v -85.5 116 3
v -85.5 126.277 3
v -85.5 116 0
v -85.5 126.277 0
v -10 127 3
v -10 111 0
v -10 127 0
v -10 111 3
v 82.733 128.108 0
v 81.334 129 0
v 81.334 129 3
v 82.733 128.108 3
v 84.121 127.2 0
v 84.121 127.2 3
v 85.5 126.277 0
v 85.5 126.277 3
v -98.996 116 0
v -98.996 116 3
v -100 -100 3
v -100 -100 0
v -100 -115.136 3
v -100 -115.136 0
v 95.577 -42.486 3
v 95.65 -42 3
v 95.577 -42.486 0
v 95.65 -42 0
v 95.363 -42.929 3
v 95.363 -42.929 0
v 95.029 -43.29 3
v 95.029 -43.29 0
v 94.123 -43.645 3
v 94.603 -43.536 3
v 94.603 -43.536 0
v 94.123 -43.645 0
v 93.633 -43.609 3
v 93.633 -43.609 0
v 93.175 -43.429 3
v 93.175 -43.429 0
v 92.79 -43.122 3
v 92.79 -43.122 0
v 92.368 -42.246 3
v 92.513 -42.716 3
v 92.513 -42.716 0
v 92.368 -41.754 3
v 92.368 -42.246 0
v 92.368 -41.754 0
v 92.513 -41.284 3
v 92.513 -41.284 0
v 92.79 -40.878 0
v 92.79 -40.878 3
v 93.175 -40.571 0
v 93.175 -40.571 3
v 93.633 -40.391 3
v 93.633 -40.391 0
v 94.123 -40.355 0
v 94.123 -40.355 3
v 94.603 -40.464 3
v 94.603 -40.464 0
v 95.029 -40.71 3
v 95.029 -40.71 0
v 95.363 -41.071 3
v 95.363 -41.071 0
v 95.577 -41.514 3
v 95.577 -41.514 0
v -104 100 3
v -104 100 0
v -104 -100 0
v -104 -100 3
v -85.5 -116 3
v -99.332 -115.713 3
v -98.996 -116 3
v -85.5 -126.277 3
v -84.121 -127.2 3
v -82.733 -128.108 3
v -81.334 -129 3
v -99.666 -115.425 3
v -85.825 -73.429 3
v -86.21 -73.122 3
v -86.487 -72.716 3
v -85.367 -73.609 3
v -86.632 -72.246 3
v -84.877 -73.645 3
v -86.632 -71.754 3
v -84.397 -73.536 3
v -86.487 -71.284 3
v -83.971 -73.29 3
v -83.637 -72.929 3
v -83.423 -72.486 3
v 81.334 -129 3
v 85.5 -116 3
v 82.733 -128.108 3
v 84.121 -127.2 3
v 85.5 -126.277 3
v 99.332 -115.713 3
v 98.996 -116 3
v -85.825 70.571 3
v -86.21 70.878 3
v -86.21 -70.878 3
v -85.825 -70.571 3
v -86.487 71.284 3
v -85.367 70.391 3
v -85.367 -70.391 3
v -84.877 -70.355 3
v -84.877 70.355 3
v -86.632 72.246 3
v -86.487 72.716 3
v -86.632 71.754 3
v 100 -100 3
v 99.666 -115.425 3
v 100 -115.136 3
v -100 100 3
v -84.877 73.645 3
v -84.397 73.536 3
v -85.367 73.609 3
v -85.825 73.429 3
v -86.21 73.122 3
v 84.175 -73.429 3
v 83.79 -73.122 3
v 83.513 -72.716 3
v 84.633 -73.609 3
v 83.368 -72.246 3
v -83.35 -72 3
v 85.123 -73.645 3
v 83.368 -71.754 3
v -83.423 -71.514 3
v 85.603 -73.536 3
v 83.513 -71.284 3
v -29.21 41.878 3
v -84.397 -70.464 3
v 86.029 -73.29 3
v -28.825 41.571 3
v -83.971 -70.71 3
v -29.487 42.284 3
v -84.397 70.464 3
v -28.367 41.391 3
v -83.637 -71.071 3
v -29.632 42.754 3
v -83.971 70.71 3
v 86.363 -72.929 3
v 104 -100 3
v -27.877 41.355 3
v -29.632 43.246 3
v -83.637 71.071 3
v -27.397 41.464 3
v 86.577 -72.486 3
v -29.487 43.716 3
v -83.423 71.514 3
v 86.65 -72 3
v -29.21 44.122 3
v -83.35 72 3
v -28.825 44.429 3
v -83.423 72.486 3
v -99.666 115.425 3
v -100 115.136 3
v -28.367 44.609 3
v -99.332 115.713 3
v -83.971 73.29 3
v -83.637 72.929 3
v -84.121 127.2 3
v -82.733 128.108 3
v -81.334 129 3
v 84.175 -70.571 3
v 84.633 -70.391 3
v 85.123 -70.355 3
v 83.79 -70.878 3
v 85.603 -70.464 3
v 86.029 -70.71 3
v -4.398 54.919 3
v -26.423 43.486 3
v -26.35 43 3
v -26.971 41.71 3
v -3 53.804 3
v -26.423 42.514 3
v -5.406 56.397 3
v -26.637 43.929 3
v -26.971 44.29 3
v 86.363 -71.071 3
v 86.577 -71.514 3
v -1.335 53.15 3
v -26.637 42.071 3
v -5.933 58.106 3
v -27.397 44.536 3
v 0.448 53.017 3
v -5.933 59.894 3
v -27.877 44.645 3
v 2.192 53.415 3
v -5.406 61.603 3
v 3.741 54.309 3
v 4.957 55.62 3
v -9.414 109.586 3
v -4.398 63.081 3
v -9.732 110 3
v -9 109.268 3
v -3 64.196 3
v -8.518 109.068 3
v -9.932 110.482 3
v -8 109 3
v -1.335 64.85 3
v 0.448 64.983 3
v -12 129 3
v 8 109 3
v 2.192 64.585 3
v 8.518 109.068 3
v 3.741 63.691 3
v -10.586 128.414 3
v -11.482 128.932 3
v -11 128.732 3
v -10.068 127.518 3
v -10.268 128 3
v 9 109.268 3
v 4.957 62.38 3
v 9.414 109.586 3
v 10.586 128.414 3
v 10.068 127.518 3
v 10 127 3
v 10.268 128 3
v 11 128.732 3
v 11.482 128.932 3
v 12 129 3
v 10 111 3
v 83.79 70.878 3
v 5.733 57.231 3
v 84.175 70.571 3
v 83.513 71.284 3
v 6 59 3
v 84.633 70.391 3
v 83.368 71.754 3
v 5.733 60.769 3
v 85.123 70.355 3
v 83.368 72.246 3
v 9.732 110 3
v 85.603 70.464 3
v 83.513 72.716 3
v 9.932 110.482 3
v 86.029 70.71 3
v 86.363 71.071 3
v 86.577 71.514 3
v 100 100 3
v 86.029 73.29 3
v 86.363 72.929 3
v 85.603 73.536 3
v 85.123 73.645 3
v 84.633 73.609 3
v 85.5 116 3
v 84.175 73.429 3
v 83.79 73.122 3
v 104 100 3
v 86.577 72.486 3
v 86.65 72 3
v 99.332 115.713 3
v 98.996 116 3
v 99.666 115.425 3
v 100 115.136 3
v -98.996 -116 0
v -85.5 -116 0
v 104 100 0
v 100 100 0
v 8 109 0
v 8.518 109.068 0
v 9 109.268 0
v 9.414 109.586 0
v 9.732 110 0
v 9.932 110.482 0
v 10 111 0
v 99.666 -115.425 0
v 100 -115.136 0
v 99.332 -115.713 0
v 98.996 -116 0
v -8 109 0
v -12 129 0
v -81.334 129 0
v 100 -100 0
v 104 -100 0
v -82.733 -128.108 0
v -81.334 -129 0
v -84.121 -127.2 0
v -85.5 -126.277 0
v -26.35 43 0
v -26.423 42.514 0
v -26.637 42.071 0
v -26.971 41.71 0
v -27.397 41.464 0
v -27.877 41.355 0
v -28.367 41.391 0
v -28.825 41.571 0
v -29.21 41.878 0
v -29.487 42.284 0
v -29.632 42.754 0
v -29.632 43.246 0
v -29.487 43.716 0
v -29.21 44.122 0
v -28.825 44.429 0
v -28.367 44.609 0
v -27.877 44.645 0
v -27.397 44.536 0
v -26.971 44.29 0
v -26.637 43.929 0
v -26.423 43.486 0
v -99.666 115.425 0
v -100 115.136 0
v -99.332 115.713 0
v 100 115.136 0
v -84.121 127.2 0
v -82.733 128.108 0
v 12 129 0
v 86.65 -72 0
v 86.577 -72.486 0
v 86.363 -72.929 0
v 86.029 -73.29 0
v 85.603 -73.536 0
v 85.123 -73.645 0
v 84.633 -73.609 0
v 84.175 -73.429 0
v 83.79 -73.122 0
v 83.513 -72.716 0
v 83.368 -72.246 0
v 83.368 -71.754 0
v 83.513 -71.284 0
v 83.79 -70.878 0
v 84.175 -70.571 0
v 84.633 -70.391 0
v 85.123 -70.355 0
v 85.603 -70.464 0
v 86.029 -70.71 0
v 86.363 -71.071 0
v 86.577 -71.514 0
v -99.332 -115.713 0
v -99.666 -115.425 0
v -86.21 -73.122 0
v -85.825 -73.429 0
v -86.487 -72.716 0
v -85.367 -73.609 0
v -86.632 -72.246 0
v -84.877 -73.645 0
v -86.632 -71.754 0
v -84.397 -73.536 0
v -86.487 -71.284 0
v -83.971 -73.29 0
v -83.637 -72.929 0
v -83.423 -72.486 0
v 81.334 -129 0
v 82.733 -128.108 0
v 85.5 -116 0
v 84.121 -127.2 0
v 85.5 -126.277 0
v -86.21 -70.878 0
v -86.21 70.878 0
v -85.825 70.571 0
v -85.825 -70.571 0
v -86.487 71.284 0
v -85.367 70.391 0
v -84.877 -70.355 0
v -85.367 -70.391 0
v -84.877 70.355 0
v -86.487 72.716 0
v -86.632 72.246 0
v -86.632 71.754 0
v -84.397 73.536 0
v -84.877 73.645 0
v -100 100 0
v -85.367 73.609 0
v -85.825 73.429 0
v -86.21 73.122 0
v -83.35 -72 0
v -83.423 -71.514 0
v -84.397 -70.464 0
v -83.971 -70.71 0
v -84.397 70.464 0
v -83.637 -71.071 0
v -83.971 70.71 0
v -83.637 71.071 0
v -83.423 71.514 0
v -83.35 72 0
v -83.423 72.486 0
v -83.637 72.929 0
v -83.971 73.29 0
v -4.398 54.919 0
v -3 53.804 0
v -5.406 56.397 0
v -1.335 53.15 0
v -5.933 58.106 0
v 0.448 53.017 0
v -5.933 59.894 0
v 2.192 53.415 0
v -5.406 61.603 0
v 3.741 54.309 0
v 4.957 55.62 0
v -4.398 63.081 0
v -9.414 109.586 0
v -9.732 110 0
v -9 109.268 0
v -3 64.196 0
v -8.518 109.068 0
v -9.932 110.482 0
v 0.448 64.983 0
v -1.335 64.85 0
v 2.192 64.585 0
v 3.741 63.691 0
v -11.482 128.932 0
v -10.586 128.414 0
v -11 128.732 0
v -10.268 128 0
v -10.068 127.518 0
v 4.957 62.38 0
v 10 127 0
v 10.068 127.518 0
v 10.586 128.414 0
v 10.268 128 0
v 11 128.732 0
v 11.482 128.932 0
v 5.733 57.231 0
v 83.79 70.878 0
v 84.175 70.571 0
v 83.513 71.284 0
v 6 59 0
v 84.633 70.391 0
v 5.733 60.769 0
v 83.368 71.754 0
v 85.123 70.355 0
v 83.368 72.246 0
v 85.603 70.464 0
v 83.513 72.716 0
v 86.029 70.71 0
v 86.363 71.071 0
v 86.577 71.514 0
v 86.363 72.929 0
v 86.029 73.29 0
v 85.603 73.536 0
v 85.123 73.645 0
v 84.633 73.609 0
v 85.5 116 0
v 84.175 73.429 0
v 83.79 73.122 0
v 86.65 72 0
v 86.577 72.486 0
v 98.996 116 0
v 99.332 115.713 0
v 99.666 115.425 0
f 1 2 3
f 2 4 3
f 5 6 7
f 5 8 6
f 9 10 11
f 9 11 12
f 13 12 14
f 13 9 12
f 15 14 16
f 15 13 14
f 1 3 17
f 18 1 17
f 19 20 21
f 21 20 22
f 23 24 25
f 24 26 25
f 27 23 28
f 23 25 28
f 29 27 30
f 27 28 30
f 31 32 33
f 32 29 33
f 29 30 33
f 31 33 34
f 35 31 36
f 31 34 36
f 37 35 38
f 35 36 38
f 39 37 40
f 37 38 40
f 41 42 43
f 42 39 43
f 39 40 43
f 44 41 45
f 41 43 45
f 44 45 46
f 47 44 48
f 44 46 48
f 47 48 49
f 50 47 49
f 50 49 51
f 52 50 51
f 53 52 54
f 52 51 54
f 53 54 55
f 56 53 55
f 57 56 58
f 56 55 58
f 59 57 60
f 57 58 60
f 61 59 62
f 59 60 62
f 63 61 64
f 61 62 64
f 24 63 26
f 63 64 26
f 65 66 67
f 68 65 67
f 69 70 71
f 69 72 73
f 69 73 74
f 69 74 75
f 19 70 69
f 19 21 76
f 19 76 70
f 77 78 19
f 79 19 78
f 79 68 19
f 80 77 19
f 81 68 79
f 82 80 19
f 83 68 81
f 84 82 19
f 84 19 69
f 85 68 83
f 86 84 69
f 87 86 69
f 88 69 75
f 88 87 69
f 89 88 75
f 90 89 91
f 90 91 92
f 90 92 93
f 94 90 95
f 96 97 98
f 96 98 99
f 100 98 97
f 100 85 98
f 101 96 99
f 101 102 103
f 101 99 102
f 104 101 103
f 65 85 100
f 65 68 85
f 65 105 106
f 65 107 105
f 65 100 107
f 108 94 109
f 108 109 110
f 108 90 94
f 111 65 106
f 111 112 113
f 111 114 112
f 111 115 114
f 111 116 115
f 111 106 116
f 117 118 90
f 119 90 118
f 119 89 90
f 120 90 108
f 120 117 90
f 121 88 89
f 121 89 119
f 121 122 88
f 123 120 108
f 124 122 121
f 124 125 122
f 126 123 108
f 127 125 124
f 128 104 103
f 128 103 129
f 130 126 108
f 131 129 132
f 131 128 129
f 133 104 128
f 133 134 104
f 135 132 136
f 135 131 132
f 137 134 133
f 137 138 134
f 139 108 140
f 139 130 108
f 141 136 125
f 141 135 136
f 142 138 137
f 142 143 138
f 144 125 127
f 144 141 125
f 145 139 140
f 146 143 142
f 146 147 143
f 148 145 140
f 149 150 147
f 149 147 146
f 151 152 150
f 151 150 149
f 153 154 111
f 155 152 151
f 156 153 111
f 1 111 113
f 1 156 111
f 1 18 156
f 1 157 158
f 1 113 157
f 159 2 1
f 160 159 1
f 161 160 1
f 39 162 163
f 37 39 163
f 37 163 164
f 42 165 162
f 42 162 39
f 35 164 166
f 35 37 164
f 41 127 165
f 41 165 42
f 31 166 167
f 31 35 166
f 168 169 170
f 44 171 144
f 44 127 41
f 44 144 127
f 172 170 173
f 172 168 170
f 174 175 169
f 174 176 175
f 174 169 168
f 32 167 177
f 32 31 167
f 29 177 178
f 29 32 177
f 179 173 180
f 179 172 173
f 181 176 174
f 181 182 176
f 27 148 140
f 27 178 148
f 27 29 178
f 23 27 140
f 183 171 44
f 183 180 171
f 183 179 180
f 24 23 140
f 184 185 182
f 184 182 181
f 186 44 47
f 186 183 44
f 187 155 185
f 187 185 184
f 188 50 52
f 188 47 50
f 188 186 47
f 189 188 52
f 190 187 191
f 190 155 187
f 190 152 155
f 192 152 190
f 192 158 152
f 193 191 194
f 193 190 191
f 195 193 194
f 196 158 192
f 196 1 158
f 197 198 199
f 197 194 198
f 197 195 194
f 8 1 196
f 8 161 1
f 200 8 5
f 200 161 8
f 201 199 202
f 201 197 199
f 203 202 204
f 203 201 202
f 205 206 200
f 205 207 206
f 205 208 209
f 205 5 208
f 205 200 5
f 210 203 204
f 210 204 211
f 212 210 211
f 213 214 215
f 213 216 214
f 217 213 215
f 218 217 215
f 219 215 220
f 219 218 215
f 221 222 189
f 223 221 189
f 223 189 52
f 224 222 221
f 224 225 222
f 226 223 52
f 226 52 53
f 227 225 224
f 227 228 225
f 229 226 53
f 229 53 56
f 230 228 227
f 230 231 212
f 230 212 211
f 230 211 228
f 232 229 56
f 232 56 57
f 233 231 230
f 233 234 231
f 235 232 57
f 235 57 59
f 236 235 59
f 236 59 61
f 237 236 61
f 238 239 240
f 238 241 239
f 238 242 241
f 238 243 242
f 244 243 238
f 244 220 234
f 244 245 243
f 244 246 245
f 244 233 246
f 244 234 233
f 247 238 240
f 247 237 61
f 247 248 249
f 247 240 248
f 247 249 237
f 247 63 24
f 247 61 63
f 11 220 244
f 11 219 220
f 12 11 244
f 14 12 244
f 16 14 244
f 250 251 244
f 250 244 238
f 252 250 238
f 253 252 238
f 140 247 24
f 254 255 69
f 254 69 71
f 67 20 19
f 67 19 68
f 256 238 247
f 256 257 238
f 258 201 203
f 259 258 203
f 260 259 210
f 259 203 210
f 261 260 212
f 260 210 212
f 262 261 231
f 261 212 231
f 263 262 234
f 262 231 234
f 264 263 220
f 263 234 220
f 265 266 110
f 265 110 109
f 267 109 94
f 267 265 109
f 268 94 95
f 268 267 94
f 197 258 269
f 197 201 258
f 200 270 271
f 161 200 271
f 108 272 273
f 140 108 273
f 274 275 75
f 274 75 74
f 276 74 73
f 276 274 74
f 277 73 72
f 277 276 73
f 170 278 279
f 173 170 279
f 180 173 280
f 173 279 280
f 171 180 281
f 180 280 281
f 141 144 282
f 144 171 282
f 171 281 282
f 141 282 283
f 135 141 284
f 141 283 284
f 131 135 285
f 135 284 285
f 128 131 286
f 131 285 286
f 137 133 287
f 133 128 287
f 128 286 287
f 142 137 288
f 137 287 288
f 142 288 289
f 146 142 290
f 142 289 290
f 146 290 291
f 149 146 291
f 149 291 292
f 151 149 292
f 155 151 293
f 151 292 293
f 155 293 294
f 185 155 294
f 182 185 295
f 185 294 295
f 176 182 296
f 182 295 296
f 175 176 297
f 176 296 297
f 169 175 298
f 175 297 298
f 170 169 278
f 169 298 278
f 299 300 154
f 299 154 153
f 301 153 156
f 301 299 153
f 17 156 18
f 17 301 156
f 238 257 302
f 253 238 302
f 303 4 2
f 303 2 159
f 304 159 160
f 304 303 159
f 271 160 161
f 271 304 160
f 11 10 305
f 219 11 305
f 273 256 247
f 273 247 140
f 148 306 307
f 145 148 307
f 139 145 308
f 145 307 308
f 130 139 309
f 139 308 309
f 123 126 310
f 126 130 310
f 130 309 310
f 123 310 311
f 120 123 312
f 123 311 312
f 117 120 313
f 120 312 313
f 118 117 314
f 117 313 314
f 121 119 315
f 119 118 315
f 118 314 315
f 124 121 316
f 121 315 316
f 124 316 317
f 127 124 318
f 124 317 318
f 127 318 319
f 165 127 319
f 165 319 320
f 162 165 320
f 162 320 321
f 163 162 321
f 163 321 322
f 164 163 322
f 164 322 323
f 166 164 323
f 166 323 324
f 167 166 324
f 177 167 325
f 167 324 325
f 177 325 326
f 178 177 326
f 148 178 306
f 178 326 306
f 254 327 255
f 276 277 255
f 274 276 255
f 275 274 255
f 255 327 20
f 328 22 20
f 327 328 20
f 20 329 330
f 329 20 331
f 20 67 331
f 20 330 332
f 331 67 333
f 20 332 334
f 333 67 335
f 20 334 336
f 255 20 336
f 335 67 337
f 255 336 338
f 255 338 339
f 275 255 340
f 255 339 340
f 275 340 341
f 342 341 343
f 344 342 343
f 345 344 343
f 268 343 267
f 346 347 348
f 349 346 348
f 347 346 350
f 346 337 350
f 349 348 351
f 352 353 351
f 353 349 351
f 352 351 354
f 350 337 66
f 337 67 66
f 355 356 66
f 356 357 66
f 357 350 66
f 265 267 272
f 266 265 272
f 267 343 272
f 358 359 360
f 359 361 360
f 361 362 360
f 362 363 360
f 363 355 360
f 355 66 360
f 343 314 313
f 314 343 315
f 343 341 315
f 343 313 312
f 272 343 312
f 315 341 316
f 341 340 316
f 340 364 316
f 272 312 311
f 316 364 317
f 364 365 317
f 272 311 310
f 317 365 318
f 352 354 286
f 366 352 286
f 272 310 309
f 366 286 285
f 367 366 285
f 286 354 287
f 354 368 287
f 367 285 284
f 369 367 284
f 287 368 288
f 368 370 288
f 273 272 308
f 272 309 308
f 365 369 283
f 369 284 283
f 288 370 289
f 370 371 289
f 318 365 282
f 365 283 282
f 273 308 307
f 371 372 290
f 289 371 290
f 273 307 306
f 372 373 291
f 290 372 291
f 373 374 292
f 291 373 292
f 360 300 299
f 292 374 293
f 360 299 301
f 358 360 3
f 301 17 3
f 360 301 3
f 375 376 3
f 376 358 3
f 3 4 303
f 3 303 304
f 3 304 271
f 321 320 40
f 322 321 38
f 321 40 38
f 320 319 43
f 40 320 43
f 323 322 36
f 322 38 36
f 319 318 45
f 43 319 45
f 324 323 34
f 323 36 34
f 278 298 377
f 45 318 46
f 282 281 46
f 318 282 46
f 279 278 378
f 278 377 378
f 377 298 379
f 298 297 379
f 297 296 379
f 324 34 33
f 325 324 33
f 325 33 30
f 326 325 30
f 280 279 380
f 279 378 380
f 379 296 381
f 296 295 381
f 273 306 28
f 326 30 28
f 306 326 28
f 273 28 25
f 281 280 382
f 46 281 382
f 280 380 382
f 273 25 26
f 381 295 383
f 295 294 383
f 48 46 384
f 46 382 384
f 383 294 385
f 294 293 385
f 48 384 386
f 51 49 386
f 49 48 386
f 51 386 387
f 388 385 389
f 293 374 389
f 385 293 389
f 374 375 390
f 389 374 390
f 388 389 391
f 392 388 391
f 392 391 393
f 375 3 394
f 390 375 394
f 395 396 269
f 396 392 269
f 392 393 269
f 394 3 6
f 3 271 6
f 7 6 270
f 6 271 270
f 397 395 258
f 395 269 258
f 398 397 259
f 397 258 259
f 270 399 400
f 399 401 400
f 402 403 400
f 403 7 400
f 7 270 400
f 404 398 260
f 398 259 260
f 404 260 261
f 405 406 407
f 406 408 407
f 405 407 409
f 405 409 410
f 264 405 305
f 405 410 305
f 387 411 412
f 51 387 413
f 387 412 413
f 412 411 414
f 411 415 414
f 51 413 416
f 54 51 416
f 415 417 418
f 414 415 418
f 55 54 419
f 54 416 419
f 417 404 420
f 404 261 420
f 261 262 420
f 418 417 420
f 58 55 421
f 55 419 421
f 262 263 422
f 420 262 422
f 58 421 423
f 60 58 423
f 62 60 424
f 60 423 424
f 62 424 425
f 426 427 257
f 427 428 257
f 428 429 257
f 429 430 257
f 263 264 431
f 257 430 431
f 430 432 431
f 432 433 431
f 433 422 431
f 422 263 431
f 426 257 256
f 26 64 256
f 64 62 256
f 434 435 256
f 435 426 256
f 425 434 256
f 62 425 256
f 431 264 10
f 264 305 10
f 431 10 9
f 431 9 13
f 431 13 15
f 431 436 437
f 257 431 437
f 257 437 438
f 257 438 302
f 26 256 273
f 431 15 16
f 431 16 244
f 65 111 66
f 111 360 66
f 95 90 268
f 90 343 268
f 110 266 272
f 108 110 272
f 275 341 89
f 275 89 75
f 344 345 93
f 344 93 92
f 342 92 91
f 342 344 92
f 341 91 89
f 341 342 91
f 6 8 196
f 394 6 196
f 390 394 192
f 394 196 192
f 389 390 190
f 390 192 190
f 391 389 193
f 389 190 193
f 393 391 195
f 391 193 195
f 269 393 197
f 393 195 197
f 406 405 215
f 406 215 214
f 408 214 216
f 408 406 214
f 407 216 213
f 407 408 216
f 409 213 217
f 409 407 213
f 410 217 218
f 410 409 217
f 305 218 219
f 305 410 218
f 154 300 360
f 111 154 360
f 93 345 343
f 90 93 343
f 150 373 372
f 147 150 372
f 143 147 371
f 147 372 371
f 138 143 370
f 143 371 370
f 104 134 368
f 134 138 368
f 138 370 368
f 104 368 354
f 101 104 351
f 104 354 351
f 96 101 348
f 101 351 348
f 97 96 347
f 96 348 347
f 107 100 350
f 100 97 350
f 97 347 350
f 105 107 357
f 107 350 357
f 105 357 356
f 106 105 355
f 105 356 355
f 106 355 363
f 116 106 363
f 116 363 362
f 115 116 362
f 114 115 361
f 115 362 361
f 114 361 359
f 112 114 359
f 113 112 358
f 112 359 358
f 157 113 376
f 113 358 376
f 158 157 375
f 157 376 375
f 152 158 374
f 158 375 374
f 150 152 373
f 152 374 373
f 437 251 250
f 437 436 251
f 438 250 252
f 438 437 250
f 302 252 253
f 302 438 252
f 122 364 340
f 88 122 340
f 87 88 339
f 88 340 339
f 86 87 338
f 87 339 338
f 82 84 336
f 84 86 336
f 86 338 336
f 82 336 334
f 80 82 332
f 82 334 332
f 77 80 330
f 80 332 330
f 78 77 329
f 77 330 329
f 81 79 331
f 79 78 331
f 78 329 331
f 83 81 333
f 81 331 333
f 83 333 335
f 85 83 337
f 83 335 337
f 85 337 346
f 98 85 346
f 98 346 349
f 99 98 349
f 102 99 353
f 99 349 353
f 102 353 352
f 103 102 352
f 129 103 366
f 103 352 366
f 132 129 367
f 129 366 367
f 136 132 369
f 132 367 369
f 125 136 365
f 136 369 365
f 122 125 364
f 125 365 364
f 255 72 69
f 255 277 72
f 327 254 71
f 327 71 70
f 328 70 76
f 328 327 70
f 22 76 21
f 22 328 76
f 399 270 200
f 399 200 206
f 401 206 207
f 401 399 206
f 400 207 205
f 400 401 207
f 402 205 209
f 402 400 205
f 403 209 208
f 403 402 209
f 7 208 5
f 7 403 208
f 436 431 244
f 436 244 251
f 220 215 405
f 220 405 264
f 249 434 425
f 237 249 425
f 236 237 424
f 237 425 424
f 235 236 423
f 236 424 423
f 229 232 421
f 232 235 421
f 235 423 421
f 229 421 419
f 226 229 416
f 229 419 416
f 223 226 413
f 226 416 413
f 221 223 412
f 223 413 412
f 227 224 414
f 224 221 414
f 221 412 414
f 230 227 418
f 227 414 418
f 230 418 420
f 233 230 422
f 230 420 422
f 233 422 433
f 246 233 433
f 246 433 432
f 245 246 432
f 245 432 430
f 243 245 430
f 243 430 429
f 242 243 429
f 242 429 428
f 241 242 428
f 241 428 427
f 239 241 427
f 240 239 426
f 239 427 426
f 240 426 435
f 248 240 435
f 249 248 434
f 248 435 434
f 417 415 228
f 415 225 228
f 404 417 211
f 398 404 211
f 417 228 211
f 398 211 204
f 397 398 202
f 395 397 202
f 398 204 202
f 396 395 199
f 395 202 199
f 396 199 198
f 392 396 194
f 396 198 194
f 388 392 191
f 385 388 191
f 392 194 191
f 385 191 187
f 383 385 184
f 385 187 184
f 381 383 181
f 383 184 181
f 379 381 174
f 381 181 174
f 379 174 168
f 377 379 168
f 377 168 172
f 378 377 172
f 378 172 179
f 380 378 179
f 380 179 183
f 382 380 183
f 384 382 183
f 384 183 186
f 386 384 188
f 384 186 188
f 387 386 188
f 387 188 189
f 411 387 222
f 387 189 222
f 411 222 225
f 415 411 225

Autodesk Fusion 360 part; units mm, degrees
sketch "Sketch1" plane through (0, 0, 0) normal (0, 0, 1) x (1, 0, 0)
  line L0 (100, 125) -> (-100, 125)
  line L1 (-100, 125) -> (-100, -125)
  line L2 (-100, -125) -> (100, -125)
  line L3 (100, -125) -> (100, 125)
  line L4 (100, 125) -> (-100, -125) construction
  line L5 (-100, 125) -> (100, -125) construction
  line L6 (-100, 125) -> (100, 125)
  line L7 (100, 125) -> (100, 129)
  line L8 (100, 129) -> (-100, 129)
  line L9 (-100, 129) -> (-100, 125)
  line L10 (-100, -125) -> (100, -125)
  line L11 (100, -125) -> (100, -129)
  line L12 (100, -129) -> (-100, -129)
  line L13 (-100, -129) -> (-100, -125)
  line L14 (100, 125) -> (104, 125)
  line L15 (104, 125) -> (104, -125)
  line L16 (104, -125) -> (100, -125)
  line L17 (100, -125) -> (100, 125)
  line L18 (-100, 125) -> (-104, 125)
  line L19 (-104, 125) -> (-104, -125)
  line L20 (-104, -125) -> (-100, -125)
  line L21 (-100, -125) -> (-100, 125)
  line L22 (-80, -53.8) -> (-80, 2.2) construction
  circle A0 centre (-80, -53.8) radius 1.65 construction
  circle A1 centre (-80, 2.2) radius 1.65 construction
  line L23 (-61.0622, -1) -> (-98.9378, -1) construction
  line L24 (-98.9378, -1) -> (-98.9378, -50.6) construction
  line L25 (-98.9378, -50.6) -> (-61.0622, -50.6) construction
  line L26 (-61.0622, -50.6) -> (-61.0622, -1) construction
  line L27 (-61.0622, -1) -> (-98.9378, -50.6) construction
  line L28 (-98.9378, -1) -> (-61.0622, -50.6) construction
  line L29 (-30.5, 49.5) -> (98.5, 49.5) construction
  line L30 (98.5, 49.5) -> (98.5, -47.5) construction
  line L31 (98.5, -47.5) -> (-30.5, -47.5) construction
  line L32 (-30.5, -47.5) -> (-30.5, 49.5) construction
  circle A2 centre (-28, 43) radius 1.65
  circle A3 centre (94, -42) radius 1.65
  line L33 (-100, 125) -> (-85.5, 125)
  line L34 (-85.5, 125) -> (-85.5, 116)
  line L35 (-85.5, 116) -> (-100, 116)
  line L36 (-100, 116) -> (-100, 125)
  line L37 (100, 125) -> (85.5, 125)
  line L38 (85.5, 125) -> (85.5, 116)
  line L39 (85.5, 116) -> (100, 116)
  line L40 (100, 116) -> (100, 125)
  line L41 (-100, -125) -> (-85.5, -125)
  line L42 (-85.5, -125) -> (-85.5, -116)
  line L43 (-85.5, -116) -> (-100, -116)
  line L44 (-100, -116) -> (-100, -125)
  line L45 (100, -125) -> (85.5, -125)
  line L46 (85.5, -125) -> (85.5, -116)
  line L47 (85.5, -116) -> (100, -116)
  line L48 (100, -116) -> (100, -125)
  line L49 (-100, 100) -> (-104, 100)
  line L50 (100, 100) -> (104, 100)
  line L51 (-100, -100) -> (-104, -100)
  line L52 (100, -100) -> (104, -100)
  line L53 (-85.5, 125) -> (-85.5, 129)
  line L54 (85.5, 125) -> (85.5, 129)
  line L55 (-85.5, -125) -> (-85.5, -129)
  line L56 (85.5, -125) -> (85.5, -129)
  line L57 (-115, -140) -> (-75, -140) construction
  line L58 (-75, -140) -> (-75, -87) construction
  line L59 (-75, -87) -> (-115, -87) construction
  line L60 (-115, -87) -> (-115, -140) construction
  line L61 (-63.3606, -140) -> (-21.3606, -140) construction
  line L62 (-21.3606, -140) -> (-21.3606, -53.8) construction
  line L63 (-21.3606, -53.8) -> (-63.3606, -53.8) construction
  line L64 (-63.3606, -53.8) -> (-63.3606, -140) construction
  line L65 (-100, 0) -> (-118.2487, 0) construction
  circle A4 centre (0, 0) radius 152.5
  circle A5 centre (-85, -72) radius 1.65
  line L66 (-85, -72) -> (85, -72) construction
  line L67 (85, -72) -> (85, 72) construction
  line L68 (85, 72) -> (-85, 72) construction
  line L69 (-85, 72) -> (-85, -72) construction
  circle A6 centre (85, 72) radius 1.65
  circle A7 centre (85, -72) radius 1.65
  circle A8 centre (-85, 72) radius 1.65
  point P0 (-80, -25.8)
  dimension "d1" = 200
  dimension "d2" = 250
  dimension "d3" = 4
  dimension "d4" = 4
  dimension "d5" = 4
  dimension "d6" = 4
  dimension "d7" = 20
  dimension "d8" = 56
  dimension "d10" = 3.3
  dimension "d11" = 37.8755
  dimension "d12" = 49.6
  dimension "d13" = 2.5
  dimension "d14" = 6.5
  dimension "d15" = 3.3
  dimension "d16" = 5.5
  dimension "d17" = 4.5
  dimension "d18" = 129
  dimension "d19" = 97
  dimension "d20" = 1.5
  dimension "d21" = 14.5
  dimension "d22" = 9
  dimension "d23" = 14.5
  dimension "d24" = 9
  dimension "d25" = 14.5
  dimension "d26" = 14.5
  dimension "d27" = 9
  dimension "d28" = 9
  dimension "d29" = 25
  dimension "d30" = 25
  dimension "d31" = 25
  dimension "d32" = 25
  dimension "d33" = 40
  dimension "d34" = 53
  dimension "d35" = 15
  dimension "d36" = 15
  dimension "d37" = 3.3
  dimension "d38" = 86.2
  dimension "d39" = 42
  dimension "d40" = 1
  dimension "d50" = 305
  dimension "d51" = 3.3
  dimension "d52" = 15
  dimension "d53" = 15
  dimension "d54" = 15
  dimension "d55" = 53
  dimension "d56" = 53
  dimension "d57" = 170
  dimension "d58" = 144
  dimension "d60" = 47.5
  dimension "d61" = 49.5
extrude "Extrude1" add sketch "Sketch1" along normal blind 3 contours L0 L1 L2 L3 L6 L10 L17 L21 L34 L35 L38 L39 L42 L43 L46 L47 A4 | L0 L6 L8 L53 L54 A4 | L3 L15 L17 L50 L52 | L1 L19 L21 L49 L51 | L2 L10 L12 L55 L56 A4
sketch "Sketch2" plane through (0, 0, 3) normal (0, 0, 1) x (1, 0, 0)
  circle A0 centre (85, -72) radius 1.65
  circle A1 centre (-85, -72) radius 1.65
  circle A2 centre (85, 72) radius 1.65
  circle A3 centre (94, -42) radius 1.65
  circle A4 centre (-85, 72) radius 1.65
  circle A5 centre (-28, 43) radius 1.65
  line L0 (100, 100) -> (100, 115.1358)
  arc A6 (100, 115.1358) -> (98.9962, 116) centre (0, 0) ccw
  line L1 (98.9962, 116) -> (85.5, 116)
  line L2 (85.5, 116) -> (85.5, 126.2775)
  arc A7 (85.5, 126.2775) -> (81.3342, 129) centre (0, 0) ccw
  line L3 (81.3342, 129) -> (-81.3342, 129)
  arc A8 (-81.3342, 129) -> (-85.5, 126.2775) centre (0, 0) ccw
  line L4 (-85.5, 126.2775) -> (-85.5, 116)
  line L5 (-85.5, 116) -> (-98.9962, 116)
  arc A9 (-98.9962, 116) -> (-100, 115.1358) centre (0, 0) ccw
  line L6 (-100, 115.1358) -> (-100, 100)
  line L7 (-100, 100) -> (-104, 100)
  line L8 (-104, 100) -> (-104, -100)
  line L9 (-104, -100) -> (-100, -100)
  line L10 (-100, -100) -> (-100, -115.1358)
  arc A10 (-100, -115.1358) -> (-98.9962, -116) centre (0, 0) ccw
  line L11 (-98.9962, -116) -> (-85.5, -116)
  line L12 (-85.5, -116) -> (-85.5, -126.2775)
  arc A11 (-85.5, -126.2775) -> (-81.3342, -129) centre (0, 0) ccw
  line L13 (-81.3342, -129) -> (81.3342, -129)
  arc A12 (81.3342, -129) -> (85.5, -126.2775) centre (0, 0) ccw
  line L14 (85.5, -126.2775) -> (85.5, -116)
  line L15 (85.5, -116) -> (98.9962, -116)
  arc A13 (98.9962, -116) -> (100, -115.1358) centre (0, 0) ccw
  line L16 (100, -115.1358) -> (100, -100)
  line L17 (100, -100) -> (104, -100)
  line L18 (104, -100) -> (104, 100)
  line L19 (104, 100) -> (100, 100)
  line L20 (-10, 129) -> (10, 129)
  line L21 (10, 129) -> (10, 111)
  line L22 (8, 109) -> (-8, 109)
  line L23 (-10, 111) -> (-10, 129)
  arc A14 (-10, 111) -> (-8, 109) centre (-8, 111) ccw
  arc A15 (8, 109) -> (10, 111) centre (8, 111) ccw
  point P0 (10, 109)
  point P1 (-10, 109)
  dimension "d62" = 20
  dimension "d63" = 20
  dimension "d64" = 2
extrude "Extrude2" cut sketch "Sketch2" against normal blind 3 contours L3 L20 L21 L22 L23 A14 A15
fillet "Fillet4" radius 2 2 edges at (-10, 129, 1.5) (10, 129, 1.5)
sketch "Sketch3" plane through (0, 0, 3) normal (0, 0, 1) x (1, 0, 0)
  arc A0 (12, 129) -> (10, 127) centre (12, 127) ccw
  line L0 (10, 127) -> (10, 111)
  arc A1 (8, 109) -> (10, 111) centre (8, 111) ccw
  line L1 (8, 109) -> (-8, 109)
  arc A2 (-10, 111) -> (-8, 109) centre (-8, 111) ccw
  line L2 (-10, 111) -> (-10, 127)
  arc A3 (-10, 127) -> (-12, 129) centre (-12, 127) ccw
  line L3 (-12, 129) -> (-81.3342, 129)
  arc A4 (-81.3342, 129) -> (-85.5, 126.2775) centre (0, 0) ccw
  line L4 (-85.5, 126.2775) -> (-85.5, 116)
  line L5 (-85.5, 116) -> (-98.9962, 116)
  arc A5 (-98.9962, 116) -> (-100, 115.1358) centre (0, 0) ccw
  line L6 (-100, 115.1358) -> (-100, 100)
  line L7 (-100, 100) -> (-104, 100)
  line L8 (-104, 100) -> (-104, -100)
  line L9 (-104, -100) -> (-100, -100)
  line L10 (-100, -100) -> (-100, -115.1358)
  arc A6 (-100, -115.1358) -> (-98.9962, -116) centre (0, 0) ccw
  line L11 (-98.9962, -116) -> (-85.5, -116)
  line L12 (-85.5, -116) -> (-85.5, -126.2775)
  arc A7 (-85.5, -126.2775) -> (-81.3342, -129) centre (0, 0) ccw
  line L13 (-81.3342, -129) -> (81.3342, -129)
  arc A8 (81.3342, -129) -> (85.5, -126.2775) centre (0, 0) ccw
  line L14 (85.5, -126.2775) -> (85.5, -116)
  line L15 (85.5, -116) -> (98.9962, -116)
  arc A9 (98.9962, -116) -> (100, -115.1358) centre (0, 0) ccw
  line L16 (100, -115.1358) -> (100, -100)
  line L17 (100, -100) -> (104, -100)
  line L18 (104, -100) -> (104, 100)
  line L19 (104, 100) -> (100, 100)
  line L20 (100, 100) -> (100, 115.1358)
  arc A10 (100, 115.1358) -> (98.9962, 116) centre (0, 0) ccw
  line L21 (98.9962, 116) -> (85.5, 116)
  line L22 (85.5, 116) -> (85.5, 126.2775)
  arc A11 (85.5, 126.2775) -> (81.3342, 129) centre (0, 0) ccw
  line L23 (81.3342, 129) -> (12, 129)
  circle A12 centre (85, -72) radius 1.65
  circle A13 centre (-85, -72) radius 1.65
  circle A14 centre (85, 72) radius 1.65
  circle A15 centre (94, -42) radius 1.65
  circle A16 centre (-85, 72) radius 1.65
  circle A17 centre (-28, 43) radius 1.65
  circle A18 centre (0, 59) radius 6
  dimension "d69" = 12
  dimension "d70" = 50
  dimension "d71" = 104
extrude "Extrude3" cut sketch "Sketch3" against normal blind 3 contours A18
sketch "Sketch4" plane through (0, 0, 3) normal (0, 0, 1) x (1, 0, 0)
  circle A0 centre (0, 59) radius 6
  arc A1 (12, 129) -> (10, 127) centre (12, 127) ccw
  line L0 (10, 127) -> (10, 111)
  arc A2 (8, 109) -> (10, 111) centre (8, 111) ccw
  line L1 (8, 109) -> (-8, 109)
  arc A3 (-10, 111) -> (-8, 109) centre (-8, 111) ccw
  line L2 (-10, 111) -> (-10, 127)
  arc A4 (-10, 127) -> (-12, 129) centre (-12, 127) ccw
  line L3 (-12, 129) -> (-81.3342, 129)
  arc A5 (-81.3342, 129) -> (-85.5, 126.2775) centre (0, 0) ccw
  line L4 (-85.5, 126.2775) -> (-85.5, 116)
  line L5 (-85.5, 116) -> (-98.9962, 116)
  arc A6 (-98.9962, 116) -> (-100, 115.1358) centre (0, 0) ccw
  line L6 (-100, 115.1358) -> (-100, 100)
  line L7 (-100, 100) -> (-104, 100)
  line L8 (-104, 100) -> (-104, -100)
  line L9 (-104, -100) -> (-100, -100)
  line L10 (-100, -100) -> (-100, -115.1358)
  arc A7 (-100, -115.1358) -> (-98.9962, -116) centre (0, 0) ccw
  line L11 (-98.9962, -116) -> (-85.5, -116)
  line L12 (-85.5, -116) -> (-85.5, -126.2775)
  arc A8 (-85.5, -126.2775) -> (-81.3342, -129) centre (0, 0) ccw
  line L13 (-81.3342, -129) -> (81.3342, -129)
  arc A9 (81.3342, -129) -> (85.5, -126.2775) centre (0, 0) ccw
  line L14 (85.5, -126.2775) -> (85.5, -116)
  line L15 (85.5, -116) -> (98.9962, -116)
  arc A10 (98.9962, -116) -> (100, -115.1358) centre (0, 0) ccw
  line L16 (100, -115.1358) -> (100, -100)
  line L17 (100, -100) -> (104, -100)
  line L18 (104, -100) -> (104, 100)
  line L19 (104, 100) -> (100, 100)
  line L20 (100, 100) -> (100, 115.1358)
  arc A11 (100, 115.1358) -> (98.9962, 116) centre (0, 0) ccw
  line L21 (98.9962, 116) -> (85.5, 116)
  line L22 (85.5, 116) -> (85.5, 126.2775)
  arc A12 (85.5, 126.2775) -> (81.3342, 129) centre (0, 0) ccw
  line L23 (81.3342, 129) -> (12, 129)
  circle A13 centre (85, -72) radius 1.65
  circle A14 centre (-85, -72) radius 1.65
  circle A15 centre (85, 72) radius 1.65
  circle A16 centre (94, -42) radius 1.65
  circle A17 centre (-85, 72) radius 1.65
  circle A18 centre (-28, 43) radius 1.65
equation "d4 = d3"
equation "d5 = d3"
equation "d6 = d3"
equation "d23 = d21"
equation "d24 = d22"
equation "d25 = d21"
equation "d26 = d25"
equation "d27 = d22"
equation "d28 = d24"
equation "d30 = d29"
equation "d31 = d29"
equation "d32 = d29"
equation "d36 = d35"
equation "d60 = d19 / 2 - 1 mm"
